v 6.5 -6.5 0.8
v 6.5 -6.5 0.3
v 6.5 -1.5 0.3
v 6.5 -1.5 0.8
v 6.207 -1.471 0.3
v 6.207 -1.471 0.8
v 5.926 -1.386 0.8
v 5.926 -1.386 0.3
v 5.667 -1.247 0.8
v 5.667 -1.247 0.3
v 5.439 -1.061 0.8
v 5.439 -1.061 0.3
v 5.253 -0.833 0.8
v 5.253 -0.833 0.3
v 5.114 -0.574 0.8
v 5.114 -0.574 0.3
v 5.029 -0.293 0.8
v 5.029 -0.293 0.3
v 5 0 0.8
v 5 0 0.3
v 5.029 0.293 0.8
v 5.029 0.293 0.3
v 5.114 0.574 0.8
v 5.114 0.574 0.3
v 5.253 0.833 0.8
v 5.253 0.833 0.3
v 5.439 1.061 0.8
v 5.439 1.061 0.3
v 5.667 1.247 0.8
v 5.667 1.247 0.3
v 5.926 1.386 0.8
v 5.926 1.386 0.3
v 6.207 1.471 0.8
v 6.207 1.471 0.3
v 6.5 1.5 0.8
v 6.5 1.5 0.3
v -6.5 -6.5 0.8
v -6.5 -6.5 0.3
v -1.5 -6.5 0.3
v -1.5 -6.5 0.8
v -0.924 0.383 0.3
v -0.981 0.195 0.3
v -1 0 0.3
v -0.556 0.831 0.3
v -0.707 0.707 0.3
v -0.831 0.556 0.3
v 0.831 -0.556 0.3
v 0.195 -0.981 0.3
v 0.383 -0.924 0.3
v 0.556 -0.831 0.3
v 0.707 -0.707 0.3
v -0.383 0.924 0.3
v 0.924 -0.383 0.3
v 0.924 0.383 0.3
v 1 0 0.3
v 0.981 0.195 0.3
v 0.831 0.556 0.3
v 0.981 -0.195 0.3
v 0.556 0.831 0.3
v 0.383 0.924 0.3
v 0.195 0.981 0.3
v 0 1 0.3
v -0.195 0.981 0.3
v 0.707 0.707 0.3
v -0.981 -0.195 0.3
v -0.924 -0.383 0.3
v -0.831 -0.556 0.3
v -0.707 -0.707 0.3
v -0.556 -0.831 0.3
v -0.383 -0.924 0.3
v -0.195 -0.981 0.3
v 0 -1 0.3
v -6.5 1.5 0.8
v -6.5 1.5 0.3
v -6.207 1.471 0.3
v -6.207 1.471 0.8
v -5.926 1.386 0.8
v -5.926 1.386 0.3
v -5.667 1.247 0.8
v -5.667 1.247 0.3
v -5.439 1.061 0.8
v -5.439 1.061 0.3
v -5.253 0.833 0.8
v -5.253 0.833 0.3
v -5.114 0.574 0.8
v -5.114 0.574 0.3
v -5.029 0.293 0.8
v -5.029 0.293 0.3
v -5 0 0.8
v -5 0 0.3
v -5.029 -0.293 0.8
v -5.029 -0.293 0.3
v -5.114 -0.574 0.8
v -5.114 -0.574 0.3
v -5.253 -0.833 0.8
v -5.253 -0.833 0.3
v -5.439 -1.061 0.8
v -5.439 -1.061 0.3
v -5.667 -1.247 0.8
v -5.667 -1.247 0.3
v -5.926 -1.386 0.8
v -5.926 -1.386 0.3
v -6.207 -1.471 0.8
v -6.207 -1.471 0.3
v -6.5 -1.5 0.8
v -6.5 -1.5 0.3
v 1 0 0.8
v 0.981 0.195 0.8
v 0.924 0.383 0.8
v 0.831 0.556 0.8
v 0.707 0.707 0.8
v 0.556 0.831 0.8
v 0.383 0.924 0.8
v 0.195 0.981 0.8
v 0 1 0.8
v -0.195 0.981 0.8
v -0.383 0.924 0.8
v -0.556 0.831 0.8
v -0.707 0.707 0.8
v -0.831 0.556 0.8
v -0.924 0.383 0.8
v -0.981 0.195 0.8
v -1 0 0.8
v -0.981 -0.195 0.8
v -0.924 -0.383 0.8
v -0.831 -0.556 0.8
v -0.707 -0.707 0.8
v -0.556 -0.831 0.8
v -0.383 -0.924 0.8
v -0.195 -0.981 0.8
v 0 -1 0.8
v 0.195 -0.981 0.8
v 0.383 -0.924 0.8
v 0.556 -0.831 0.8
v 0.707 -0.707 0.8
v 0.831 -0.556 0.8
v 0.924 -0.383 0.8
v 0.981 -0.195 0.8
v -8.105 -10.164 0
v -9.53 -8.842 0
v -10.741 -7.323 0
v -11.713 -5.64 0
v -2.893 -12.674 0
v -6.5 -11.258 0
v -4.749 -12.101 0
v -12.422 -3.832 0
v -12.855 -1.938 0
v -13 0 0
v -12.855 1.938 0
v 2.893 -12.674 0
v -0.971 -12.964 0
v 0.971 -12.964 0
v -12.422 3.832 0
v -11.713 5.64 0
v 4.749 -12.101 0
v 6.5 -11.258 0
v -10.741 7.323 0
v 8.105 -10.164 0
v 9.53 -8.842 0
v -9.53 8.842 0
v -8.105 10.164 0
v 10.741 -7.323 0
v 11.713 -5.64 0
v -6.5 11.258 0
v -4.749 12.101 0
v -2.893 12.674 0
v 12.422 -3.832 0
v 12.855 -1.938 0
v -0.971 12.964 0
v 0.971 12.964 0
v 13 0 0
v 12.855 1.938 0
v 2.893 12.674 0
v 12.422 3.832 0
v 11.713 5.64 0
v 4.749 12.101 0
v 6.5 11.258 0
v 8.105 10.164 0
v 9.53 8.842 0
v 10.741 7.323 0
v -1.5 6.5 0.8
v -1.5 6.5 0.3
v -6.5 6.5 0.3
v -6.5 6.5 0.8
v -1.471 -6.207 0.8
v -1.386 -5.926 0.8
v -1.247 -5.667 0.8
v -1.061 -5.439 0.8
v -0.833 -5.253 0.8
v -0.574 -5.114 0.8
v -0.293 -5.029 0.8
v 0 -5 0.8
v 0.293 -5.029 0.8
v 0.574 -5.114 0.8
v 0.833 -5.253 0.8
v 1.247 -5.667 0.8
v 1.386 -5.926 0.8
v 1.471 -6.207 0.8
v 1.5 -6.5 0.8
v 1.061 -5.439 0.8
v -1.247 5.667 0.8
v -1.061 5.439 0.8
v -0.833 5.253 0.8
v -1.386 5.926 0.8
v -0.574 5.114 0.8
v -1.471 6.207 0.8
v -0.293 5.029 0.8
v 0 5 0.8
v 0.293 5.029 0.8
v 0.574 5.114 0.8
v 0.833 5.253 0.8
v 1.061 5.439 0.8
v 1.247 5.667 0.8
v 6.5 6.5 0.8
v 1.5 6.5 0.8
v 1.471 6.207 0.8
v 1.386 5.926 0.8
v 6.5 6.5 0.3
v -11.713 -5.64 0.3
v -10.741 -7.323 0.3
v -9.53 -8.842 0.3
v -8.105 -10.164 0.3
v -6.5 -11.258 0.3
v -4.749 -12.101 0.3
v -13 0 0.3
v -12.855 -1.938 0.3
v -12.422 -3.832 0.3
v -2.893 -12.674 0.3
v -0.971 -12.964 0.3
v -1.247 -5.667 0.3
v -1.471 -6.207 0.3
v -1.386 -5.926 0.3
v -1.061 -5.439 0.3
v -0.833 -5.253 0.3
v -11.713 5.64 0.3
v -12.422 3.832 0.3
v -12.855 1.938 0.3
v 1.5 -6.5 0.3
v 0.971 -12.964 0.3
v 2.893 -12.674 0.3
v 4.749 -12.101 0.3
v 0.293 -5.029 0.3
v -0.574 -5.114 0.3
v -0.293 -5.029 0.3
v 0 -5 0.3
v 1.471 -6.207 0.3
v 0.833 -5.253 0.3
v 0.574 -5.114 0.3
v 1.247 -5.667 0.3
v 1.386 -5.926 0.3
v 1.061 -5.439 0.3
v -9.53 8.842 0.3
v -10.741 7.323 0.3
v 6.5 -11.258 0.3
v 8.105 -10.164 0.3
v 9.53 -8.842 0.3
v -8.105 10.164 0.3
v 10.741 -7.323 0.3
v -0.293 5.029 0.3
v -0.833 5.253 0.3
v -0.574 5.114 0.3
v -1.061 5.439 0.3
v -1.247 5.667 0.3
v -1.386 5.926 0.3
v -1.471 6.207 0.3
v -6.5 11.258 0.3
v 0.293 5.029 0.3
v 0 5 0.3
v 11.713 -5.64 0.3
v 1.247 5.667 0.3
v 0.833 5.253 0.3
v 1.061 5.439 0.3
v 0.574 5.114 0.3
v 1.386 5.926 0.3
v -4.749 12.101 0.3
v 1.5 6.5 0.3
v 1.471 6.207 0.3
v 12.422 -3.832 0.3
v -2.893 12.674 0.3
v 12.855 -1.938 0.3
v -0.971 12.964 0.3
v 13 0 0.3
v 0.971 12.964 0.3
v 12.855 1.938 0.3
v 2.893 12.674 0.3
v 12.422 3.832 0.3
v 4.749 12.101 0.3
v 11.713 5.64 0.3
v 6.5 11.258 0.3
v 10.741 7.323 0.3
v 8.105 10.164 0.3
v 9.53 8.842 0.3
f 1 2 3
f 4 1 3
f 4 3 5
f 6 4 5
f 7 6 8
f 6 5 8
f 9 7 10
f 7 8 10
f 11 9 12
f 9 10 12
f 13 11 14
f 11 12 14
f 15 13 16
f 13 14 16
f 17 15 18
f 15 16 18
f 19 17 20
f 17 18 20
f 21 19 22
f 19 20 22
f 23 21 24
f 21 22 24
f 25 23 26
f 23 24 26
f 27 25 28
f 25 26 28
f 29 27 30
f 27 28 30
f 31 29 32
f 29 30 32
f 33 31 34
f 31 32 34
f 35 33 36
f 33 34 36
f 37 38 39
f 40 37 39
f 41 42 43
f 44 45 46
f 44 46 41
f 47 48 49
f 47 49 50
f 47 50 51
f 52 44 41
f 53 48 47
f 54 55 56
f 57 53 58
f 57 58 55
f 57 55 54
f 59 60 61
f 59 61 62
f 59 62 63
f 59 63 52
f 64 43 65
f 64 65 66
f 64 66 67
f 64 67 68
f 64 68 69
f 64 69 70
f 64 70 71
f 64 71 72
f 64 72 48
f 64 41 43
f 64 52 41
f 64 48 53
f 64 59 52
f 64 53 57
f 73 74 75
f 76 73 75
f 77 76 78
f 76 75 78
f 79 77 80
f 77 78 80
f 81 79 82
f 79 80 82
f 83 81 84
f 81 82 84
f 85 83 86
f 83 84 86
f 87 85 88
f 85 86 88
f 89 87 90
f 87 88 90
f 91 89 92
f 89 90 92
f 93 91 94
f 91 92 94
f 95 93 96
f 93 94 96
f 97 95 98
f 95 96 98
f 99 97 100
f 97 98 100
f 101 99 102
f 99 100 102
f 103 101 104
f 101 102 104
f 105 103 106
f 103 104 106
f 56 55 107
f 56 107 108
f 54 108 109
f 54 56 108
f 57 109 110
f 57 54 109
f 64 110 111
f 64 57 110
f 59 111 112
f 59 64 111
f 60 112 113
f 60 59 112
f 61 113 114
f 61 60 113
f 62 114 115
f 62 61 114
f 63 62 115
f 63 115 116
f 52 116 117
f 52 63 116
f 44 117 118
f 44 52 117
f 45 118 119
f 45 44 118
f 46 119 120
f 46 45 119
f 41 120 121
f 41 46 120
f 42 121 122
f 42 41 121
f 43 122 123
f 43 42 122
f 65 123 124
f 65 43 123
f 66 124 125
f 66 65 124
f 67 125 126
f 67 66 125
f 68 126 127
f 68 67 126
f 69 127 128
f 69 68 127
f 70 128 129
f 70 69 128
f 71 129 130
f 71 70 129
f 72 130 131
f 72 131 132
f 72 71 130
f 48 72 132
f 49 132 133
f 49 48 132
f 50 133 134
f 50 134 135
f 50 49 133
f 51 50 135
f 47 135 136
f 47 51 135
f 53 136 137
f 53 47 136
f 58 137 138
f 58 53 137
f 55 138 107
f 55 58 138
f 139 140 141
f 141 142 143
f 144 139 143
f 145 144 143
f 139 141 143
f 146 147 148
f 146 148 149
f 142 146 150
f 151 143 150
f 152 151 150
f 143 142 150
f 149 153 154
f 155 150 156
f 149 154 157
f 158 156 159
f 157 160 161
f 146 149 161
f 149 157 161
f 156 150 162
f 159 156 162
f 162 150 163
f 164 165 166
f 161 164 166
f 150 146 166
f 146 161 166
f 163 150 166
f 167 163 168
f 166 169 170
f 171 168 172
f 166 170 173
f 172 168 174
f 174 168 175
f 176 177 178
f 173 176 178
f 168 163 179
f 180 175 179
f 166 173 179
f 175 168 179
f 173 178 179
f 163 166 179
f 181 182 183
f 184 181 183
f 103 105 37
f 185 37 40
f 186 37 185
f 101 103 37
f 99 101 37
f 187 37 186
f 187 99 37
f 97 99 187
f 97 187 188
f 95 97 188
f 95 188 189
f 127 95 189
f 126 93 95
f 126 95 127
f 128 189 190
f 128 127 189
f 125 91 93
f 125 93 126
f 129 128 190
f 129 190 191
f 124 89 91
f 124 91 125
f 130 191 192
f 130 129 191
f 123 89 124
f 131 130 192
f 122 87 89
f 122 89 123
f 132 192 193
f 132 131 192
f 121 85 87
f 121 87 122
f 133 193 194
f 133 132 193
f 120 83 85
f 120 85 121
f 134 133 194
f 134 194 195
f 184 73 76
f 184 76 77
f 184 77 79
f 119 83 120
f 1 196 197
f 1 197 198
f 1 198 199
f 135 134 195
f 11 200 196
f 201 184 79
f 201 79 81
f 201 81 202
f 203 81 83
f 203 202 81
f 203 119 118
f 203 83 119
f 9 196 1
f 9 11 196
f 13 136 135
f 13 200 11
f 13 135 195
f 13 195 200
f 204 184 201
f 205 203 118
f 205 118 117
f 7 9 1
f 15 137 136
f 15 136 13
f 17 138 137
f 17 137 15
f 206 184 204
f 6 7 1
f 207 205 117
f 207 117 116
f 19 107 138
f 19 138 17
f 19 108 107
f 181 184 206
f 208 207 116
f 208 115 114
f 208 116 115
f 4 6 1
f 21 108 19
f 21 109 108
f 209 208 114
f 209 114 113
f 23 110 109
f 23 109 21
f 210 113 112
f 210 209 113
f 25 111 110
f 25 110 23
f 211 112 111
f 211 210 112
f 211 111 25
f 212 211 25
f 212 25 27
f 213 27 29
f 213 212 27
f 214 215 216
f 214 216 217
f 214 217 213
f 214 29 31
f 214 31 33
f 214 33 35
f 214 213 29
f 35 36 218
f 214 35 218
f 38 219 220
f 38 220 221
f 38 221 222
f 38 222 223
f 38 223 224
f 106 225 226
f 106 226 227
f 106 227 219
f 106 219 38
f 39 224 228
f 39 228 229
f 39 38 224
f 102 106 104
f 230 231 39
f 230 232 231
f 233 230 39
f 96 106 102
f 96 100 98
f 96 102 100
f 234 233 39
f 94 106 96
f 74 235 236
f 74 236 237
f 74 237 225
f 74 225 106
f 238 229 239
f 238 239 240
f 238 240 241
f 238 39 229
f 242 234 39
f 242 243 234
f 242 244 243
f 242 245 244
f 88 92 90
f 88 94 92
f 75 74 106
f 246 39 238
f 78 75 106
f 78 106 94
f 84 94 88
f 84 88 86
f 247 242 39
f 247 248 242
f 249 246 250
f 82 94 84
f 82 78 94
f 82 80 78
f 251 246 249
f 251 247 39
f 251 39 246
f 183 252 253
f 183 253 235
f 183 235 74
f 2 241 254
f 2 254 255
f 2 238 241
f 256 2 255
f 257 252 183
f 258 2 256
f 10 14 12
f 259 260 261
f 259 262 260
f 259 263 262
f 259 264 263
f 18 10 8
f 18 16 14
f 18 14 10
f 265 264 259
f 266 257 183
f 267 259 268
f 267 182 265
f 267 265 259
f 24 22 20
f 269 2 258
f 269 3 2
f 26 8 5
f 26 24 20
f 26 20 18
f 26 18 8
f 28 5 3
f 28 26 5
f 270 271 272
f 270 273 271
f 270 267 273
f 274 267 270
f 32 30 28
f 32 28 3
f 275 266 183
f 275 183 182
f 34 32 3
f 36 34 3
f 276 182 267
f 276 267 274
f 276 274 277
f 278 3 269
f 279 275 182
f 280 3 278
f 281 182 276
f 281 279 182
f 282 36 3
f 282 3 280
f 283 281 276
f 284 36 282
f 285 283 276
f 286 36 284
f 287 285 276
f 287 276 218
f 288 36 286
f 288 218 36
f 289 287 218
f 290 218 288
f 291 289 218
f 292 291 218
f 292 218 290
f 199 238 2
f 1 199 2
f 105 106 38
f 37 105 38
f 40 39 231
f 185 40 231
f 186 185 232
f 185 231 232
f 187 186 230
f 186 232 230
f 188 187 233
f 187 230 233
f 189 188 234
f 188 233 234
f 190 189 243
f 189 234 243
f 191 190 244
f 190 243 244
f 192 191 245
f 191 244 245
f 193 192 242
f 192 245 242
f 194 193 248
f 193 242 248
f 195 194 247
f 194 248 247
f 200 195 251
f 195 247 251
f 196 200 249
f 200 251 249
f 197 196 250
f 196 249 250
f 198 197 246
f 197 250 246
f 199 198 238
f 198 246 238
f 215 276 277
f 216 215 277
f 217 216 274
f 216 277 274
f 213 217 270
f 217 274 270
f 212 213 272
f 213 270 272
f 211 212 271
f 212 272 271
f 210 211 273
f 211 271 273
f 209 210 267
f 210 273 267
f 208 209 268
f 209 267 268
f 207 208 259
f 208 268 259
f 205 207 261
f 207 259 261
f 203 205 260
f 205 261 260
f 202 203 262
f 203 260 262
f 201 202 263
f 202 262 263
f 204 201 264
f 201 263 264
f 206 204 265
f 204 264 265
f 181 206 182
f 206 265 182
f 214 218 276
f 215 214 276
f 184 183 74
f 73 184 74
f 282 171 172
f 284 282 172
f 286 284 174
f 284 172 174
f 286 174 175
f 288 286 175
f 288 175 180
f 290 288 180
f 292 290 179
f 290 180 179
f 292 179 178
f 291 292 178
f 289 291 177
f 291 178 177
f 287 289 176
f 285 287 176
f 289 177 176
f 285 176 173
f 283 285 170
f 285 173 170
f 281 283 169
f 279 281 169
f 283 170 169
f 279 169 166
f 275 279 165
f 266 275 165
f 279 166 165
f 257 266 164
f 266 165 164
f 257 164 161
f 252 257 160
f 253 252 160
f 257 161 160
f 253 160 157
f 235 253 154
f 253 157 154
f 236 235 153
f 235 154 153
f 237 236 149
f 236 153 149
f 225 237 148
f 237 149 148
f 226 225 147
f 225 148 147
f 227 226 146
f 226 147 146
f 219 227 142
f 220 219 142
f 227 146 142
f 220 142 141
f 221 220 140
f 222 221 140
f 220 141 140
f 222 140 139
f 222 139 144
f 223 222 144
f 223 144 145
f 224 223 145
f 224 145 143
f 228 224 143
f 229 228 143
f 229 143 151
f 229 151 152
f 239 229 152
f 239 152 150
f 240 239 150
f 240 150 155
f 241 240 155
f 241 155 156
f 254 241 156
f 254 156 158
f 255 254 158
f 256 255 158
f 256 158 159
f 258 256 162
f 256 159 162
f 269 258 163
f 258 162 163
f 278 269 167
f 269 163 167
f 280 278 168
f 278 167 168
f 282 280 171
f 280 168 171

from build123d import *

# Parameters (mm, degrees)
F0_R     = 13
F1_DEPTH = 0.3
F2_R     = 1
F3_DEPTH = 0.5


with BuildPart() as f1:
    # F0 (on Top) → F1 (new body)
    with BuildSketch(Plane.XY):
        Circle(F0_R)
    extrude(amount=F1_DEPTH)

    # F2 (on face) → F3 (join)
    with BuildSketch(Plane.XY.offset(0.3)):
        with BuildLine():
            Line((6.5, 1.5), (6.5, 6.5))
            Line((6.5, 6.5), (1.5, 6.5))
            ThreePointArc((1.5, 6.5), (0, 5), (-1.5, 6.5))
            Line((-1.5, 6.5), (-6.5, 6.5))
            Line((-6.5, 6.5), (-6.5, 1.5))
            ThreePointArc((-6.5, 1.5), (-5, 0), (-6.5, -1.5))
            Line((-6.5, -1.5), (-6.5, -6.5))
            Line((-6.5, -6.5), (-1.5, -6.5))
            ThreePointArc((-1.5, -6.5), (0, -5), (1.5, -6.5))
            Line((1.5, -6.5), (6.5, -6.5))
            Line((6.5, -6.5), (6.5, -1.5))
            ThreePointArc((6.5, -1.5), (5, 0), (6.5, 1.5))
        make_face()
        Circle(F2_R, mode=Mode.SUBTRACT)
    extrude(amount=F3_DEPTH)


solid = f1.part
